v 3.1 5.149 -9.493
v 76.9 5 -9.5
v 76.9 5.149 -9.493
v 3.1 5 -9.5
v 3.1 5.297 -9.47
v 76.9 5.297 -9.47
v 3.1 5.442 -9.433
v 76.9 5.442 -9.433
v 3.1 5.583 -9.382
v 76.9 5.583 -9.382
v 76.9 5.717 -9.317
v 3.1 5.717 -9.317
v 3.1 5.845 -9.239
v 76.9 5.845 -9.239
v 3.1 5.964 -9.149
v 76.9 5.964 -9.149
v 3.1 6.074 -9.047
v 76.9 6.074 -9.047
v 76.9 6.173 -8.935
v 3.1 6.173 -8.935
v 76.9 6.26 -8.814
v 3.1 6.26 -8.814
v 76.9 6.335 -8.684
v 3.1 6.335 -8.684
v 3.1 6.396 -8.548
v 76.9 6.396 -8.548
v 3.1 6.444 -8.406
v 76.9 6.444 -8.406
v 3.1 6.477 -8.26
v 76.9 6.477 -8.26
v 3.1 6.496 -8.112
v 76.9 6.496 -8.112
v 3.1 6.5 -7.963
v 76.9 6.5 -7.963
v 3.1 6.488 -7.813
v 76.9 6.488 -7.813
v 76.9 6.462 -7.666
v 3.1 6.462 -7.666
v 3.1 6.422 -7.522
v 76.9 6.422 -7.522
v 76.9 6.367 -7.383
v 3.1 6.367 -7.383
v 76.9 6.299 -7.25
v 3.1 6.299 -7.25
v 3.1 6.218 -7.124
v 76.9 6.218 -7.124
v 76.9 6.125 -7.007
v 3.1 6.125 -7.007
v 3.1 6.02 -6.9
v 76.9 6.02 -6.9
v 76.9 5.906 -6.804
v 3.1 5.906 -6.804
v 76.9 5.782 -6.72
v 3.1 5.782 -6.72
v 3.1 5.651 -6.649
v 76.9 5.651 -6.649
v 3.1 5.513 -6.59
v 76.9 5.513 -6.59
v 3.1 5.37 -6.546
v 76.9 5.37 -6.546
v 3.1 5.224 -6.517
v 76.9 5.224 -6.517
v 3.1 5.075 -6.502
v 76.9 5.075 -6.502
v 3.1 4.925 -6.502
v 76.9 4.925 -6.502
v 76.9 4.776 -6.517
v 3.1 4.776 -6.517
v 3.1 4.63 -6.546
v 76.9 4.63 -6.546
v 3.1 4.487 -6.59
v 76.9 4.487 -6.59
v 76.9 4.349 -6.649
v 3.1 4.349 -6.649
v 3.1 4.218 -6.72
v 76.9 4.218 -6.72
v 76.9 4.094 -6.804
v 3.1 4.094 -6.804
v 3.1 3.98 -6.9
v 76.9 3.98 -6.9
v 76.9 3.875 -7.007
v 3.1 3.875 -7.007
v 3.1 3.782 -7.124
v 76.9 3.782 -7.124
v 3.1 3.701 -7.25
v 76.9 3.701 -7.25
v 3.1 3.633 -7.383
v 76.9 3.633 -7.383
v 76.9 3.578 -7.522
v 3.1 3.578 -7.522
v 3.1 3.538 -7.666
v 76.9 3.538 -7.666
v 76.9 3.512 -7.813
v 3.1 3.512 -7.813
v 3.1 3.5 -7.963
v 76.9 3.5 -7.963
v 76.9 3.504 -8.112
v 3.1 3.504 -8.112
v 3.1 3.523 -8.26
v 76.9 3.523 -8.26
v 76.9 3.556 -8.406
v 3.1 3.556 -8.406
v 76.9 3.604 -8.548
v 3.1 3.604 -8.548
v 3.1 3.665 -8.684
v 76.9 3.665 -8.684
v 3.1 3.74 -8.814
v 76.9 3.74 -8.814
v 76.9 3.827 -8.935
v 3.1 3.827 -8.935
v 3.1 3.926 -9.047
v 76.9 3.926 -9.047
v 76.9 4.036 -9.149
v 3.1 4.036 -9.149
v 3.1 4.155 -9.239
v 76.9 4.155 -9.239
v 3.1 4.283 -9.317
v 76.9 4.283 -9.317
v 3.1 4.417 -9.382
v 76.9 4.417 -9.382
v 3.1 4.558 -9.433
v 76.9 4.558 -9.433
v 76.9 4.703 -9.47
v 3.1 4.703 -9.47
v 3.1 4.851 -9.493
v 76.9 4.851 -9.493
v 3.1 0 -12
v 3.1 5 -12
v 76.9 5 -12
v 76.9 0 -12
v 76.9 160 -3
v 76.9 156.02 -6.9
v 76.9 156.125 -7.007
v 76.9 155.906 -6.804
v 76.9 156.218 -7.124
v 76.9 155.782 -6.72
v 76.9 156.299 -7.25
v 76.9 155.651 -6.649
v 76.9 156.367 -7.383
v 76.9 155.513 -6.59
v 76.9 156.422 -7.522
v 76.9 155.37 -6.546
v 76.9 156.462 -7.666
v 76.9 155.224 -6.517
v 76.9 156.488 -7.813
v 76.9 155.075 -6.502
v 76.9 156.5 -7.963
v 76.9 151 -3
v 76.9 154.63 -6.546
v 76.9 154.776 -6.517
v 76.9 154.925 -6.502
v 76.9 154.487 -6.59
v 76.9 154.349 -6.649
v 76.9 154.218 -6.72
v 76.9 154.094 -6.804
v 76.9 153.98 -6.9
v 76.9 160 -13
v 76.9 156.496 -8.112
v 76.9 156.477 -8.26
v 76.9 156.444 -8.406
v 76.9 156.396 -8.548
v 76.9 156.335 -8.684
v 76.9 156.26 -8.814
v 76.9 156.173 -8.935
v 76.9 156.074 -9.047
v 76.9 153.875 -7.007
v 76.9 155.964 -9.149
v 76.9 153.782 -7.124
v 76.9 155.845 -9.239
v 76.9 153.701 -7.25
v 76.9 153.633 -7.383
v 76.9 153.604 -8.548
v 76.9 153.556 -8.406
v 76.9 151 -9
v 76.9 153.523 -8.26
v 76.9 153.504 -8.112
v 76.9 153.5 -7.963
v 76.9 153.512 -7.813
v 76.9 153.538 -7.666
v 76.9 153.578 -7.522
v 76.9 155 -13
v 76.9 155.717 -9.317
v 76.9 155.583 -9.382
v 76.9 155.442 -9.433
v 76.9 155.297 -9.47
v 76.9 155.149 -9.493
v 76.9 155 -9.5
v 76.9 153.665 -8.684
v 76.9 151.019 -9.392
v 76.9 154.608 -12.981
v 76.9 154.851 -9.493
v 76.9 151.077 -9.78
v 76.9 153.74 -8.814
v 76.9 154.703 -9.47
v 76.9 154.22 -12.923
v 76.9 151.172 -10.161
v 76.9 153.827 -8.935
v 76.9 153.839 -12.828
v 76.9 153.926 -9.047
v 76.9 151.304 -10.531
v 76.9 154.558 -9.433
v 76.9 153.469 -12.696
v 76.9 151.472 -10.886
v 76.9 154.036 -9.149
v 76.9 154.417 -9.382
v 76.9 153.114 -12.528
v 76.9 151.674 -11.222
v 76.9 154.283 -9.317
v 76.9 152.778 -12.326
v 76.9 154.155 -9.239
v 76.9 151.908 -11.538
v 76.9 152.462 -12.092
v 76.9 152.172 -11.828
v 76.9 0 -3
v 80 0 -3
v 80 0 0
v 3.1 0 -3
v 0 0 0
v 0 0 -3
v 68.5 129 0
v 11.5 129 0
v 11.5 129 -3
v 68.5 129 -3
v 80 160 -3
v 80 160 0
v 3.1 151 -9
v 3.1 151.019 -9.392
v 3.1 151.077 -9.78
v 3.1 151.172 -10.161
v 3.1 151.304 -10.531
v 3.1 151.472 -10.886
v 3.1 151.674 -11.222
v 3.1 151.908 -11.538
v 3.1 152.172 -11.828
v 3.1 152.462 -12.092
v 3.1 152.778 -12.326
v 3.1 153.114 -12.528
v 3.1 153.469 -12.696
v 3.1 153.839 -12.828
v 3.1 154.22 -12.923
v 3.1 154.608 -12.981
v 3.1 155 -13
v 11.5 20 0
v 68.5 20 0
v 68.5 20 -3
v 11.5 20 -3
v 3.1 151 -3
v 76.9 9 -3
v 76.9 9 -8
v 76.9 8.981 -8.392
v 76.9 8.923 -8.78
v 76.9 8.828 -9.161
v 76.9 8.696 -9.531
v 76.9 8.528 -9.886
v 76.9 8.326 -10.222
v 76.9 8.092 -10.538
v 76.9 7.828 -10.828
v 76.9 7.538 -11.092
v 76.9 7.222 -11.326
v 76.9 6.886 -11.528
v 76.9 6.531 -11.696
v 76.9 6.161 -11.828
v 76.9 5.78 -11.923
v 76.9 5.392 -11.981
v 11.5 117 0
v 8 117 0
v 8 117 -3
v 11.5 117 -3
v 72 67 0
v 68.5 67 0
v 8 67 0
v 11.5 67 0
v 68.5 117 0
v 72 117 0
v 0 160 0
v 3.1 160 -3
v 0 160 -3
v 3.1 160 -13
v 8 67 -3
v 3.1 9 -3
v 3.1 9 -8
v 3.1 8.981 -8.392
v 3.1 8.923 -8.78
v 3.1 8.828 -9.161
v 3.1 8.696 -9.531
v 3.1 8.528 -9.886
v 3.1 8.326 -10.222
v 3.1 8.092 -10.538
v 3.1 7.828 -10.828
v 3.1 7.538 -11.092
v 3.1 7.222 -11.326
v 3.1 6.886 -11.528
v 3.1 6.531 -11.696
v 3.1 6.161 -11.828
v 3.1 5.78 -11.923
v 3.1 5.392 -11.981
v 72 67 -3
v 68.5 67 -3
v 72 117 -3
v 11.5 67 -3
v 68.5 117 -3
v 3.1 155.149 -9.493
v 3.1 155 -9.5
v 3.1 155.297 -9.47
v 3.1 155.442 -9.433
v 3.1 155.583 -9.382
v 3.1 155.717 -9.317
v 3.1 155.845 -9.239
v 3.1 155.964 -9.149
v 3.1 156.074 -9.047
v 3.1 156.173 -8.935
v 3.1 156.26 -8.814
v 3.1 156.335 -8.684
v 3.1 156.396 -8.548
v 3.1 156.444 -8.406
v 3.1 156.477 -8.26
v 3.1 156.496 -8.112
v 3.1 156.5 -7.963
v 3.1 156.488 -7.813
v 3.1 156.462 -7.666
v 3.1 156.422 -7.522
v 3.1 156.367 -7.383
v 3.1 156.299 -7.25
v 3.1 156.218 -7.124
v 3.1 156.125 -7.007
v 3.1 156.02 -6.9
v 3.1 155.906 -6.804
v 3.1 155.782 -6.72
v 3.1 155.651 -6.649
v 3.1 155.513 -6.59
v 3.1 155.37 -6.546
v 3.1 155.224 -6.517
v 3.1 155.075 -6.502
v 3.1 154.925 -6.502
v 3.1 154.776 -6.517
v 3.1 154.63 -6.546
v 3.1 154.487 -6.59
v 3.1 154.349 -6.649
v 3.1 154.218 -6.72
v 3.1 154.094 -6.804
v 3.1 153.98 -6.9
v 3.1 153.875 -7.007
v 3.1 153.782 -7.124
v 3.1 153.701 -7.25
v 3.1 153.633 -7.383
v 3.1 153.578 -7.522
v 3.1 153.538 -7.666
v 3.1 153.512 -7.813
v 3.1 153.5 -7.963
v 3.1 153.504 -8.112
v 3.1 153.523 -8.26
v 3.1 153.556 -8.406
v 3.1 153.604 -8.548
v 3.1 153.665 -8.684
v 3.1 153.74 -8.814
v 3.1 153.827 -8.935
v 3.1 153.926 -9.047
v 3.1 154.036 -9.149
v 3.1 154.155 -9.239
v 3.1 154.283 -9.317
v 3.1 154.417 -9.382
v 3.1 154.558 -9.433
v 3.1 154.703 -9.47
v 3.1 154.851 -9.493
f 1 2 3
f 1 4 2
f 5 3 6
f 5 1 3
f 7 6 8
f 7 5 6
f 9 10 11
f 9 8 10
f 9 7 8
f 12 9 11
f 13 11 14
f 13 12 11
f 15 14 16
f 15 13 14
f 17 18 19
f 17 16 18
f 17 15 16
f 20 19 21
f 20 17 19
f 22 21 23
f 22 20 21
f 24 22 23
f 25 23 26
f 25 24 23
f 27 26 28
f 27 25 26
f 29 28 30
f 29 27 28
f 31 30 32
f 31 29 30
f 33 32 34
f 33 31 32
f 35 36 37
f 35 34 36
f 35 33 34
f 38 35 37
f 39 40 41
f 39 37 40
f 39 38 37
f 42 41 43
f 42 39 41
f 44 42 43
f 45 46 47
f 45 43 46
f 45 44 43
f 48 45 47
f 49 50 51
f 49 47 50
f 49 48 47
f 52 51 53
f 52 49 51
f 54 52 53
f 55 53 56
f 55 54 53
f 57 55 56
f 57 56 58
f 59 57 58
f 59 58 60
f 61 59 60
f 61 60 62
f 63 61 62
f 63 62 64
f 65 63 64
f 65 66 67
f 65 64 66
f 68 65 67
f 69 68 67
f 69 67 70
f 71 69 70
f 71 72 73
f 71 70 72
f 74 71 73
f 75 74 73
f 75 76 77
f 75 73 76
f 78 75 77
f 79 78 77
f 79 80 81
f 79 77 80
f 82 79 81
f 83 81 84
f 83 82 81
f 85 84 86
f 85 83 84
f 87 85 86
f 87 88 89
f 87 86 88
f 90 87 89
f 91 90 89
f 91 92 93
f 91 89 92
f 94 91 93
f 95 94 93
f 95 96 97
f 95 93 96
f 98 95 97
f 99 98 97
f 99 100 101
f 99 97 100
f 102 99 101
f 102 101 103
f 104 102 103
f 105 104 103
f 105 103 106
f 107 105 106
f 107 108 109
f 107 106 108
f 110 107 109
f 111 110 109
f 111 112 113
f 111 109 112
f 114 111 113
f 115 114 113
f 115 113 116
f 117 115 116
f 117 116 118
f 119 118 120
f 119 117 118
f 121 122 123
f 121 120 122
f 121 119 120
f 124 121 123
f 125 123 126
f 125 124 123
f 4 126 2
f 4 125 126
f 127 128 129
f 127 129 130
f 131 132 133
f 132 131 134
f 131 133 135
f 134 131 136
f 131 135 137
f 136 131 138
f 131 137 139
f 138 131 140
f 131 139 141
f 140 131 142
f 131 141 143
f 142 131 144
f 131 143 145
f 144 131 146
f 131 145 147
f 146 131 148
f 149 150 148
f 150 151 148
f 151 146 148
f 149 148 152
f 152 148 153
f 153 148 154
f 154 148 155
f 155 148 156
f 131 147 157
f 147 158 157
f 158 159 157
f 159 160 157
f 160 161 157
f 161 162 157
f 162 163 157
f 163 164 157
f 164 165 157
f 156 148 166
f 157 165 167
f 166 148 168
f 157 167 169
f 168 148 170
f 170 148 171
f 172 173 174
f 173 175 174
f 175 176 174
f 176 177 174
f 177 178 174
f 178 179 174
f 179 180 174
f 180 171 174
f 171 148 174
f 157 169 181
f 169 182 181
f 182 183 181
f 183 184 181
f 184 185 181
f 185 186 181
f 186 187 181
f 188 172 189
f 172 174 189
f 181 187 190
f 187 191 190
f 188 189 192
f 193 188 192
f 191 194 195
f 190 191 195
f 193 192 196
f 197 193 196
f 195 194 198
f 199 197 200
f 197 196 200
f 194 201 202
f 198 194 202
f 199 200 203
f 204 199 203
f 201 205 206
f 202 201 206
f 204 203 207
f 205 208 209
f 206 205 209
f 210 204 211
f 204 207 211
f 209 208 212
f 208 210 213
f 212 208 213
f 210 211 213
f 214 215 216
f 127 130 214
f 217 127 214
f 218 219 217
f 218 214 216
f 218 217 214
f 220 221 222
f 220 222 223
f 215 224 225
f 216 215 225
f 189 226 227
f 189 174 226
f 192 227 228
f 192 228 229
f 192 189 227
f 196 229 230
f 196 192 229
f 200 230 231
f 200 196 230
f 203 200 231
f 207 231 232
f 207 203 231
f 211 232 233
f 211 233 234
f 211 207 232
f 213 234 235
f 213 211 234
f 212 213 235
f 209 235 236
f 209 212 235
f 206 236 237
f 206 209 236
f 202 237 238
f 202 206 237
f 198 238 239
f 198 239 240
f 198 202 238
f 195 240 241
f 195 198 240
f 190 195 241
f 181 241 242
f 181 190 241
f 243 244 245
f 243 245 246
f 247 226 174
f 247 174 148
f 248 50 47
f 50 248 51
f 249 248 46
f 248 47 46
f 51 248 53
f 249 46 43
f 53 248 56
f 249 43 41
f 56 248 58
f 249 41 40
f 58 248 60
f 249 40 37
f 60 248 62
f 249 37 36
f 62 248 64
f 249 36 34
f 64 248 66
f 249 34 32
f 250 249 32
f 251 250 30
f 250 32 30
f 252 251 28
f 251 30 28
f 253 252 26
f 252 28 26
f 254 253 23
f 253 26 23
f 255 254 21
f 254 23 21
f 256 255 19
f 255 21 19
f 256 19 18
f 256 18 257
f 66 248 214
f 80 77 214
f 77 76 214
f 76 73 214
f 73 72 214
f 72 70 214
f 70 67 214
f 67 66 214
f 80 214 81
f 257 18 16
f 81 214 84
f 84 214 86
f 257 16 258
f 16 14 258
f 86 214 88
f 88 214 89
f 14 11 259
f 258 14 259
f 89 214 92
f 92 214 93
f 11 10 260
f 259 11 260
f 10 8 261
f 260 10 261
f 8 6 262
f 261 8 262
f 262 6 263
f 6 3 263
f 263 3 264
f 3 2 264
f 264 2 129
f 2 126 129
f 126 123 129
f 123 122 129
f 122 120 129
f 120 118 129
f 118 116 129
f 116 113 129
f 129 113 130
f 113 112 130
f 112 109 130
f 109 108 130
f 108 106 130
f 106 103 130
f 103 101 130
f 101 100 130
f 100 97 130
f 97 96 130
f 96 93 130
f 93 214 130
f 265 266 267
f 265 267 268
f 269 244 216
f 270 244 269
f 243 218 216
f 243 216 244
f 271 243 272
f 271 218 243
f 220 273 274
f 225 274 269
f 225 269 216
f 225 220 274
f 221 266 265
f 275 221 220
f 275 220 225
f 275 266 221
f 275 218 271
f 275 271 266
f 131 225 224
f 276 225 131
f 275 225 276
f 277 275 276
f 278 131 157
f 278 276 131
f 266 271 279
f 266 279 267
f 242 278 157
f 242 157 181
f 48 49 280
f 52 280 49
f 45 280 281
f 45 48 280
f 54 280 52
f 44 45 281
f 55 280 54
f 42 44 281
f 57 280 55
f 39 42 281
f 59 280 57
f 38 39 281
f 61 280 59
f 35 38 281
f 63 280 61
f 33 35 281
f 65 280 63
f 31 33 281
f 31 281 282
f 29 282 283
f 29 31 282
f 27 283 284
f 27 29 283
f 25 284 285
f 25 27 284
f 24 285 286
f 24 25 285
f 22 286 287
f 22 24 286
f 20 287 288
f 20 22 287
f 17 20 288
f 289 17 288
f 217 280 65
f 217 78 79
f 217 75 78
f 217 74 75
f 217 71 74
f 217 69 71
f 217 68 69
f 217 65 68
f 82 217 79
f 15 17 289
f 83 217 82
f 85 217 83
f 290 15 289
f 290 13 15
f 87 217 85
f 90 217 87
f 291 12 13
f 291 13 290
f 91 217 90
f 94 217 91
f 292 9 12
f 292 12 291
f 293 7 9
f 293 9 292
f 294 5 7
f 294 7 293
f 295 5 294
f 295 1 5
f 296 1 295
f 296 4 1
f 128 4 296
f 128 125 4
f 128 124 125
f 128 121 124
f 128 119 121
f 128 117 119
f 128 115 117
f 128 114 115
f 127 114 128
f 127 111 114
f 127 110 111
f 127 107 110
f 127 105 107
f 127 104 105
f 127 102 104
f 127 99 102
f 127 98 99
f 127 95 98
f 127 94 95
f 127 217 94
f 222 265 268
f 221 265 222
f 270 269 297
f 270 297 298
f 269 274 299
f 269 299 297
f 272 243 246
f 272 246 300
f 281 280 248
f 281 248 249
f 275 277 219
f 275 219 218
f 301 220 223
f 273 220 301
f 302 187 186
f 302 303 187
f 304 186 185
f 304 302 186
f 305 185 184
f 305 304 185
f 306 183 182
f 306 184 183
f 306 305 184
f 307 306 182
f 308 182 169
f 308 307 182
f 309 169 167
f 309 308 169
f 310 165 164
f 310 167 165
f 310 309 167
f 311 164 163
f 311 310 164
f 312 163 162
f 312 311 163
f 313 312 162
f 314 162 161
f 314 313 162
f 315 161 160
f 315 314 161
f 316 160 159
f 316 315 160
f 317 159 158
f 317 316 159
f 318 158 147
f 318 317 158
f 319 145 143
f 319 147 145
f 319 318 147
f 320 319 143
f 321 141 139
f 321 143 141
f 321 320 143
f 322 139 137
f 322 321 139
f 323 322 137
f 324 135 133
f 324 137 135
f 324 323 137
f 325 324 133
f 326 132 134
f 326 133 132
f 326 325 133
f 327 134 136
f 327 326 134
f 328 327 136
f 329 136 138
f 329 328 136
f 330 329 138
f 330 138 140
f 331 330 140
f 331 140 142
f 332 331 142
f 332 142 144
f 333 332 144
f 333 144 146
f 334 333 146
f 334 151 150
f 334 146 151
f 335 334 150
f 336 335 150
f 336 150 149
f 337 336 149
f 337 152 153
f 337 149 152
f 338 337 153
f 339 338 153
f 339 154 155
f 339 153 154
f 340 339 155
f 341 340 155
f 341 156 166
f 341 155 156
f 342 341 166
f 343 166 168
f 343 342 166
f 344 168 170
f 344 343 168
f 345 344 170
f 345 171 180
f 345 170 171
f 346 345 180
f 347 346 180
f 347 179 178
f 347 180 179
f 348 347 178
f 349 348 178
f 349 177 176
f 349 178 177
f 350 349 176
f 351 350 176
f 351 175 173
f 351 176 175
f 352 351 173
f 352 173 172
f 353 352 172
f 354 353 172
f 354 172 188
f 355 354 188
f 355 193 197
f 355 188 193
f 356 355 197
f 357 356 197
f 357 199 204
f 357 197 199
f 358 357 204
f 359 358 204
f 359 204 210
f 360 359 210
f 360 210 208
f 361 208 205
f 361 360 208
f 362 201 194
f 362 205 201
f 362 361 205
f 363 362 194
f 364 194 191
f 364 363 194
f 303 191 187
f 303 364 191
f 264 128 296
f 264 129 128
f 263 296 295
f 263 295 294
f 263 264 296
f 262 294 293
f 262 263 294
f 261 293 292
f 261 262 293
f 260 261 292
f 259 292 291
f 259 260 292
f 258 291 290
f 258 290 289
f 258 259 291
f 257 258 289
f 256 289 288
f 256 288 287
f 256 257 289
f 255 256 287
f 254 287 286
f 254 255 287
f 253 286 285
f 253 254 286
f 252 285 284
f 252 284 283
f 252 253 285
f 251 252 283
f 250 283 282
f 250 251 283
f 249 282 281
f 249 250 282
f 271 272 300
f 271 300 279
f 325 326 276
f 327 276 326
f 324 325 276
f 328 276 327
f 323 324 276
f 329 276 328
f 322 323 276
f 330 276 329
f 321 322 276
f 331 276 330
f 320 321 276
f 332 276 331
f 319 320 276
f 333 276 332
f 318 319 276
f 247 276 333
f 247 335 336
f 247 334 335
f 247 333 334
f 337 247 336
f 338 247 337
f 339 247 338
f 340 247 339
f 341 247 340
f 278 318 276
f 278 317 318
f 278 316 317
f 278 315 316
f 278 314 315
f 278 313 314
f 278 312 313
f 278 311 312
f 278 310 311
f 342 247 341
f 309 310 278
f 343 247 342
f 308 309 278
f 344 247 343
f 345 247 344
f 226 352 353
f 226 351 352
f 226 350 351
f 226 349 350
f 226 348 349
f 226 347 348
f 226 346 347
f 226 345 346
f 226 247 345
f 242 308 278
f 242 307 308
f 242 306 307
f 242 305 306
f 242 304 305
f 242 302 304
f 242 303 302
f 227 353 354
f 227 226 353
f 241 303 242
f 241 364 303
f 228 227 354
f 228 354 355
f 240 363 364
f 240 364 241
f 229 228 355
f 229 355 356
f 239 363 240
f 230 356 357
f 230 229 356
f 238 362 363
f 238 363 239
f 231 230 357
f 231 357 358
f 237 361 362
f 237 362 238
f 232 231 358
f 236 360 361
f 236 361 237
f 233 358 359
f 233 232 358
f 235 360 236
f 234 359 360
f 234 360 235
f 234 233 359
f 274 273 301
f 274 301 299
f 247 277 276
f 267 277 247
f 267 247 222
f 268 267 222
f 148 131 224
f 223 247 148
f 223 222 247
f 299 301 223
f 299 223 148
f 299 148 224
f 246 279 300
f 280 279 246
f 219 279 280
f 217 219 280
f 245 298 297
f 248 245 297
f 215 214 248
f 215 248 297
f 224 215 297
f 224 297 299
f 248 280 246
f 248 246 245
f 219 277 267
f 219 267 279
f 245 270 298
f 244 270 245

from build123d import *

# Parameters (mm, degrees)
SKETCH3_R           = 1.5
BOSS_EXTRUDE3_DEPTH = 80
CUT_EXTRUDE1_DEPTH  = 180.357185527
SKETCH5_W           = 3.1
SKETCH5_H           = 12
CUT_EXTRUDE2_DEPTH  = 180.357185527
FILLET1_R           = 4


with BuildPart() as part:
    # Sketch3 → Boss-Extrude3 (new body)
    with BuildSketch(Plane(origin=(0, 0, 0), x_dir=(0, 0, -1), z_dir=(1, 0, 0))):
        Polygon((0, 160), (13, 160), (13, 151), (3, 151), (3, 9), (12, 9), (12, 0), (0, 0), align=None)
        with Locations((8, 155)):
            Circle(SKETCH3_R, mode=Mode.SUBTRACT)
        with Locations((8, 5)):
            Circle(SKETCH3_R, mode=Mode.SUBTRACT)
    extrude(amount=BOSS_EXTRUDE3_DEPTH)

    # Sketch4 → Cut-Extrude1 (cut, through all)
    with BuildSketch(Plane.XY):
        Polygon((11.5, 117), (11.5, 129), (68.5, 129), (68.5, 117), (72, 117), (72, 67), (68.5, 67), (68.5, 20), (11.5, 20), (11.5, 67), (8, 67), (8, 117), align=None)
    extrude(amount=-CUT_EXTRUDE1_DEPTH, mode=Mode.SUBTRACT)

    # Sketch5 → Cut-Extrude2 (cut, through all)
    with BuildSketch(Plane(origin=(0, 0, 0), x_dir=(1, 0, 0), z_dir=(0, 1, 0))):
        with Locations((78.45, 9)):
            Rectangle(SKETCH5_W, SKETCH5_H)
        with Locations((1.55, 9)):
            Rectangle(SKETCH5_W, SKETCH5_H)
    extrude(amount=CUT_EXTRUDE2_DEPTH, mode=Mode.SUBTRACT)

    # Fillet1
    fillet1_edges = [part.edges().sort_by_distance(p)[0] for p in [
        (40, 151, -13),
        (40, 9, -12),
    ]]
    fillet(fillet1_edges, radius=FILLET1_R)


solid = part.part
